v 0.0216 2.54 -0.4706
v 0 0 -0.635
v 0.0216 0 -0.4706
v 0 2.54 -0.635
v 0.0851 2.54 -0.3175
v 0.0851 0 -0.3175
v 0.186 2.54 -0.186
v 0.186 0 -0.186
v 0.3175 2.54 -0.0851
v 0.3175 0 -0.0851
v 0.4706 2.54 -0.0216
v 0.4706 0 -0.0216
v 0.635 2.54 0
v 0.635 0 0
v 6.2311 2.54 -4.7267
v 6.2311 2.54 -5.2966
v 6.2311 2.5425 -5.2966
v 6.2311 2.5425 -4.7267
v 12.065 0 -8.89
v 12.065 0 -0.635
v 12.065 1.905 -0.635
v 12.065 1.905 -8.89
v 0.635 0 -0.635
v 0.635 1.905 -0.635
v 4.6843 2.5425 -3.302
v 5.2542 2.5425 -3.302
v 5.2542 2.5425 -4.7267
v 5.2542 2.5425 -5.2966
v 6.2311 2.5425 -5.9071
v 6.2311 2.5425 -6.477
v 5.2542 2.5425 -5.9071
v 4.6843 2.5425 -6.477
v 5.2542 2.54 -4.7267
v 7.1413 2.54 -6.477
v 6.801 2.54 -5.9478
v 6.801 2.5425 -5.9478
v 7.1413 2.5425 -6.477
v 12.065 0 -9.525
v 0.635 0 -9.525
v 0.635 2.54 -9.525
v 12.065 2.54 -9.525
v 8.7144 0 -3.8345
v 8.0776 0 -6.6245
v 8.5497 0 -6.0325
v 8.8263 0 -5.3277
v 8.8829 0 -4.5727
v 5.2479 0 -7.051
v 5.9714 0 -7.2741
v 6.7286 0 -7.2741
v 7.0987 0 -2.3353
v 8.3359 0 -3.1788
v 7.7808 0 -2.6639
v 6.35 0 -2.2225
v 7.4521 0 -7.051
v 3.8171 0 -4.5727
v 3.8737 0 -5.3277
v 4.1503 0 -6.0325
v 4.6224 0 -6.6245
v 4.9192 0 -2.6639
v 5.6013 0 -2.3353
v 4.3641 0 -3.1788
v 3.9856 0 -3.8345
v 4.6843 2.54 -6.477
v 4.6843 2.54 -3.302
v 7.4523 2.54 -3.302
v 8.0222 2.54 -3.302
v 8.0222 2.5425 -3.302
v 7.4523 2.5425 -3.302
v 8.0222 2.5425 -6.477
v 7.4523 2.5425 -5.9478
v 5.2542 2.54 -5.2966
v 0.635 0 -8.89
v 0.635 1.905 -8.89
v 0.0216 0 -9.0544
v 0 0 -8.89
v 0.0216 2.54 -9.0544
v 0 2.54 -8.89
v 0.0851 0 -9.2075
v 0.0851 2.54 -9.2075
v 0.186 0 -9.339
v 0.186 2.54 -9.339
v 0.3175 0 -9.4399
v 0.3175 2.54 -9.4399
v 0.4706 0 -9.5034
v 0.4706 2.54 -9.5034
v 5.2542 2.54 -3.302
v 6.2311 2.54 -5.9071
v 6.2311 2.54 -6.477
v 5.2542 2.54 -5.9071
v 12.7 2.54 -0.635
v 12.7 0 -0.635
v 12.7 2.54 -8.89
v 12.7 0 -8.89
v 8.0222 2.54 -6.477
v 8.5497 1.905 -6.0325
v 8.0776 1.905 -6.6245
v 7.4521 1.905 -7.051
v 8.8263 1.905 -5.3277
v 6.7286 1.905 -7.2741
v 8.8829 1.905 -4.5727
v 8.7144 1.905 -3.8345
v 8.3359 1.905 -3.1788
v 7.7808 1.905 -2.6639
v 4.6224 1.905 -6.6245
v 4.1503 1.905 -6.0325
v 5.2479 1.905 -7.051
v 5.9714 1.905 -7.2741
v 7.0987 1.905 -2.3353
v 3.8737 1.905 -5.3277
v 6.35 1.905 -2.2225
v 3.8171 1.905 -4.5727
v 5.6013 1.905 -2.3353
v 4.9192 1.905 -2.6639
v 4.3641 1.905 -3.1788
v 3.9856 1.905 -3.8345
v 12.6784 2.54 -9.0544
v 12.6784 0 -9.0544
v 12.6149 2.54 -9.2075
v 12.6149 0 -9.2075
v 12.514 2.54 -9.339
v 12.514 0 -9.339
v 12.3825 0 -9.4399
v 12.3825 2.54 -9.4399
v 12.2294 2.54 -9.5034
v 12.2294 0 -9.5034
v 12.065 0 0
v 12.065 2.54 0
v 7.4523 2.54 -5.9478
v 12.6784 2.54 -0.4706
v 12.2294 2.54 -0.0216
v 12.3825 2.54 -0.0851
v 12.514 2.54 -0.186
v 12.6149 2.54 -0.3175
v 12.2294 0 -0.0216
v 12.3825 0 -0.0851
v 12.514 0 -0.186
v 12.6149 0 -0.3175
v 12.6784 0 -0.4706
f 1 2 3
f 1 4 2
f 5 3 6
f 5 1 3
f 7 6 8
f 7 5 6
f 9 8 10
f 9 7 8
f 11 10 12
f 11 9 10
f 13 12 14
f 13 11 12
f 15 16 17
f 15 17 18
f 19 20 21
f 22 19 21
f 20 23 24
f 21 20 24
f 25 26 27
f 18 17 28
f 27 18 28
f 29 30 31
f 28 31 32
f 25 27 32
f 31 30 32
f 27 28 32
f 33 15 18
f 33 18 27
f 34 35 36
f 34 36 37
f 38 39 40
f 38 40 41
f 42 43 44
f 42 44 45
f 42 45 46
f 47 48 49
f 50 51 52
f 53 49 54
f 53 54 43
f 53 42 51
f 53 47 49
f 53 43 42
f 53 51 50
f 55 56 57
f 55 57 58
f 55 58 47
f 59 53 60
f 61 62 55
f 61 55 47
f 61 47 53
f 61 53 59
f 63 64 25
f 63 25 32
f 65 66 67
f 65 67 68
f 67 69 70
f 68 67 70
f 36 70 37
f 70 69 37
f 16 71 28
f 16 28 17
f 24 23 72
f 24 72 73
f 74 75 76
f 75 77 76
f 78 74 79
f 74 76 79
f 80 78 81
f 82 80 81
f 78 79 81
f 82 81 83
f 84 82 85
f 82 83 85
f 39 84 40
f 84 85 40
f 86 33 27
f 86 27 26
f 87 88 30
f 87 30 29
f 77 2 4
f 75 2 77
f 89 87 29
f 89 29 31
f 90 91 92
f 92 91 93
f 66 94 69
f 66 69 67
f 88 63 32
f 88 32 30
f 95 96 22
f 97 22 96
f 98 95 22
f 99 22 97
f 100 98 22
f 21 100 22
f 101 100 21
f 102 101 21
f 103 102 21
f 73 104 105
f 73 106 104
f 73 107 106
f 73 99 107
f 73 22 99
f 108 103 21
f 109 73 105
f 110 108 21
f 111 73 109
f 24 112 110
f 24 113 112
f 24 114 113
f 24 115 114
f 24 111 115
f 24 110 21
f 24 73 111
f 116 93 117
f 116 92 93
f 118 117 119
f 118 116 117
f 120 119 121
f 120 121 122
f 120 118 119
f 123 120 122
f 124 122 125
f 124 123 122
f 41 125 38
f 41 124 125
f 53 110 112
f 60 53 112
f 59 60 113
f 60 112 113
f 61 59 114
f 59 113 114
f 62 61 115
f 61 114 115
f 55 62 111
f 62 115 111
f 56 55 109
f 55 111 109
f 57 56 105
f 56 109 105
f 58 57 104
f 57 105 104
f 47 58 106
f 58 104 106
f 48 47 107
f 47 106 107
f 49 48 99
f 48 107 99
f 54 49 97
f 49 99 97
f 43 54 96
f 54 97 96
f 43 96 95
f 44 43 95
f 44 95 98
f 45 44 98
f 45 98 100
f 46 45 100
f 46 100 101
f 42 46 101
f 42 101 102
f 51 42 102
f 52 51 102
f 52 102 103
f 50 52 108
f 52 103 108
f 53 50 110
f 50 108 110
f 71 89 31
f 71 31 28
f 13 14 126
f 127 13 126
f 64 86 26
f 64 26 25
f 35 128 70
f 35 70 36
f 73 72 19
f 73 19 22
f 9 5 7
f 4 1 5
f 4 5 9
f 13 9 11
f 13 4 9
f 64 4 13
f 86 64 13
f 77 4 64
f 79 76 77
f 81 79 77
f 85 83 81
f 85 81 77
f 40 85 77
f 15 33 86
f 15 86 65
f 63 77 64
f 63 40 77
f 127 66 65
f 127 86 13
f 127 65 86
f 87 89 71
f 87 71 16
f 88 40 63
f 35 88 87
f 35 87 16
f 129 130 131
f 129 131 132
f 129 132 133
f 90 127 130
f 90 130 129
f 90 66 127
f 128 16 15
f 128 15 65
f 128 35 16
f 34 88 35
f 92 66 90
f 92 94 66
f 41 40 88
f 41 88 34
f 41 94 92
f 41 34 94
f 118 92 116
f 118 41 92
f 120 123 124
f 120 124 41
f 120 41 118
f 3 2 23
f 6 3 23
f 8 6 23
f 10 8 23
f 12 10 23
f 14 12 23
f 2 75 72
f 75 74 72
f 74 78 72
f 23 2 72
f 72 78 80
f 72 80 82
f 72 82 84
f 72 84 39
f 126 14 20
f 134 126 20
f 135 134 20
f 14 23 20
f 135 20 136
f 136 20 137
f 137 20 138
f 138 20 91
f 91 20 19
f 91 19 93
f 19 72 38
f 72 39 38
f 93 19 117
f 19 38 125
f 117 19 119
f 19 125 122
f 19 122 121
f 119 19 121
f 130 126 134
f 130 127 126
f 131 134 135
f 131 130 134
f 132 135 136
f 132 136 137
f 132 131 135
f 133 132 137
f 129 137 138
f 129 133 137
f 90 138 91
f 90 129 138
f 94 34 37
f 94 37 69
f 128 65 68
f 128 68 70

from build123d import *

# Parameters (mm, degrees)
SKETCH1_W           = 12.7
SKETCH1_H           = 9.525
BOSS_EXTRUDE1_DEPTH = 2.54
FILLET1_R           = 0.635
SHELL1_START        = 0.635
SHELL1_OUTLINE_W    = 1.905
SHELL1_OUTLINE_H    = 8.255
SHELL1_DEPTH        = 11.43
SKETCH2_R           = 2.54
BOSS_EXTRUDE2_DEPTH = 1.905
BOSS_EXTRUDE3_DEPTH = 0.00254


# Read off the part's stored shape, not the designer's step: Shell1
with BuildPart() as part:
    # Sketch1 → Boss-Extrude1 (new body)
    with BuildSketch(Plane(origin=(0, 0, 0), x_dir=(1, 0, 0), z_dir=(0, 1, 0))):
        with Locations((6.35, 4.7625)):
            Rectangle(SKETCH1_W, SKETCH1_H)
    extrude(amount=BOSS_EXTRUDE1_DEPTH)

    # Fillet1
    fillet1_edges = [part.edges().sort_by_distance(p)[0] for p in [
        (0, 1.27, -9.525),
        (12.7, 1.27, -9.525),
        (12.7, 1.27, 0),
        (0, 1.27, 0),
    ]]
    fillet(fillet1_edges, radius=FILLET1_R)

    # Shell1 outline → Shell1 (cut)
    with BuildSketch(Plane.YZ.offset(SHELL1_START)):
        with Locations((0.9525, -4.7625)):
            Rectangle(SHELL1_OUTLINE_W, SHELL1_OUTLINE_H)
    extrude(amount=SHELL1_DEPTH, mode=Mode.SUBTRACT)

    # Sketch2 → Boss-Extrude2 (add)
    with BuildSketch(Plane(origin=(0, 1.905, 0), x_dir=(-1, 0, 0), z_dir=(0, -1, 0))):
        with Locations(Location((-6.35, 4.7625, 0), (0, 0, 270))):
            Circle(SKETCH2_R)
    extrude(amount=BOSS_EXTRUDE2_DEPTH)

    # Sketch3 → Boss-Extrude3 (add)
    with BuildSketch(Plane(origin=(0, 2.54, 0), x_dir=(1, 0, 0), z_dir=(0, 1, 0))):
        Polygon((4.684346154, 6.477), (6.231141026, 6.477), (6.231141026, 5.907128205), (5.254217949, 5.907128205), (5.254217949, 5.296551282), (6.231141026, 5.296551282), (6.231141026, 4.726679487), (5.254217949, 4.726679487), (5.254217949, 3.302), (4.684346154, 3.302), align=None)
        Polygon((7.141282252, 6.477), (8.022166667, 6.477), (8.022166667, 3.302), (7.452294872, 3.302), (7.452294872, 5.947833333), (6.801012821, 5.947833333), align=None)
    extrude(amount=BOSS_EXTRUDE3_DEPTH)


solid = part.part
